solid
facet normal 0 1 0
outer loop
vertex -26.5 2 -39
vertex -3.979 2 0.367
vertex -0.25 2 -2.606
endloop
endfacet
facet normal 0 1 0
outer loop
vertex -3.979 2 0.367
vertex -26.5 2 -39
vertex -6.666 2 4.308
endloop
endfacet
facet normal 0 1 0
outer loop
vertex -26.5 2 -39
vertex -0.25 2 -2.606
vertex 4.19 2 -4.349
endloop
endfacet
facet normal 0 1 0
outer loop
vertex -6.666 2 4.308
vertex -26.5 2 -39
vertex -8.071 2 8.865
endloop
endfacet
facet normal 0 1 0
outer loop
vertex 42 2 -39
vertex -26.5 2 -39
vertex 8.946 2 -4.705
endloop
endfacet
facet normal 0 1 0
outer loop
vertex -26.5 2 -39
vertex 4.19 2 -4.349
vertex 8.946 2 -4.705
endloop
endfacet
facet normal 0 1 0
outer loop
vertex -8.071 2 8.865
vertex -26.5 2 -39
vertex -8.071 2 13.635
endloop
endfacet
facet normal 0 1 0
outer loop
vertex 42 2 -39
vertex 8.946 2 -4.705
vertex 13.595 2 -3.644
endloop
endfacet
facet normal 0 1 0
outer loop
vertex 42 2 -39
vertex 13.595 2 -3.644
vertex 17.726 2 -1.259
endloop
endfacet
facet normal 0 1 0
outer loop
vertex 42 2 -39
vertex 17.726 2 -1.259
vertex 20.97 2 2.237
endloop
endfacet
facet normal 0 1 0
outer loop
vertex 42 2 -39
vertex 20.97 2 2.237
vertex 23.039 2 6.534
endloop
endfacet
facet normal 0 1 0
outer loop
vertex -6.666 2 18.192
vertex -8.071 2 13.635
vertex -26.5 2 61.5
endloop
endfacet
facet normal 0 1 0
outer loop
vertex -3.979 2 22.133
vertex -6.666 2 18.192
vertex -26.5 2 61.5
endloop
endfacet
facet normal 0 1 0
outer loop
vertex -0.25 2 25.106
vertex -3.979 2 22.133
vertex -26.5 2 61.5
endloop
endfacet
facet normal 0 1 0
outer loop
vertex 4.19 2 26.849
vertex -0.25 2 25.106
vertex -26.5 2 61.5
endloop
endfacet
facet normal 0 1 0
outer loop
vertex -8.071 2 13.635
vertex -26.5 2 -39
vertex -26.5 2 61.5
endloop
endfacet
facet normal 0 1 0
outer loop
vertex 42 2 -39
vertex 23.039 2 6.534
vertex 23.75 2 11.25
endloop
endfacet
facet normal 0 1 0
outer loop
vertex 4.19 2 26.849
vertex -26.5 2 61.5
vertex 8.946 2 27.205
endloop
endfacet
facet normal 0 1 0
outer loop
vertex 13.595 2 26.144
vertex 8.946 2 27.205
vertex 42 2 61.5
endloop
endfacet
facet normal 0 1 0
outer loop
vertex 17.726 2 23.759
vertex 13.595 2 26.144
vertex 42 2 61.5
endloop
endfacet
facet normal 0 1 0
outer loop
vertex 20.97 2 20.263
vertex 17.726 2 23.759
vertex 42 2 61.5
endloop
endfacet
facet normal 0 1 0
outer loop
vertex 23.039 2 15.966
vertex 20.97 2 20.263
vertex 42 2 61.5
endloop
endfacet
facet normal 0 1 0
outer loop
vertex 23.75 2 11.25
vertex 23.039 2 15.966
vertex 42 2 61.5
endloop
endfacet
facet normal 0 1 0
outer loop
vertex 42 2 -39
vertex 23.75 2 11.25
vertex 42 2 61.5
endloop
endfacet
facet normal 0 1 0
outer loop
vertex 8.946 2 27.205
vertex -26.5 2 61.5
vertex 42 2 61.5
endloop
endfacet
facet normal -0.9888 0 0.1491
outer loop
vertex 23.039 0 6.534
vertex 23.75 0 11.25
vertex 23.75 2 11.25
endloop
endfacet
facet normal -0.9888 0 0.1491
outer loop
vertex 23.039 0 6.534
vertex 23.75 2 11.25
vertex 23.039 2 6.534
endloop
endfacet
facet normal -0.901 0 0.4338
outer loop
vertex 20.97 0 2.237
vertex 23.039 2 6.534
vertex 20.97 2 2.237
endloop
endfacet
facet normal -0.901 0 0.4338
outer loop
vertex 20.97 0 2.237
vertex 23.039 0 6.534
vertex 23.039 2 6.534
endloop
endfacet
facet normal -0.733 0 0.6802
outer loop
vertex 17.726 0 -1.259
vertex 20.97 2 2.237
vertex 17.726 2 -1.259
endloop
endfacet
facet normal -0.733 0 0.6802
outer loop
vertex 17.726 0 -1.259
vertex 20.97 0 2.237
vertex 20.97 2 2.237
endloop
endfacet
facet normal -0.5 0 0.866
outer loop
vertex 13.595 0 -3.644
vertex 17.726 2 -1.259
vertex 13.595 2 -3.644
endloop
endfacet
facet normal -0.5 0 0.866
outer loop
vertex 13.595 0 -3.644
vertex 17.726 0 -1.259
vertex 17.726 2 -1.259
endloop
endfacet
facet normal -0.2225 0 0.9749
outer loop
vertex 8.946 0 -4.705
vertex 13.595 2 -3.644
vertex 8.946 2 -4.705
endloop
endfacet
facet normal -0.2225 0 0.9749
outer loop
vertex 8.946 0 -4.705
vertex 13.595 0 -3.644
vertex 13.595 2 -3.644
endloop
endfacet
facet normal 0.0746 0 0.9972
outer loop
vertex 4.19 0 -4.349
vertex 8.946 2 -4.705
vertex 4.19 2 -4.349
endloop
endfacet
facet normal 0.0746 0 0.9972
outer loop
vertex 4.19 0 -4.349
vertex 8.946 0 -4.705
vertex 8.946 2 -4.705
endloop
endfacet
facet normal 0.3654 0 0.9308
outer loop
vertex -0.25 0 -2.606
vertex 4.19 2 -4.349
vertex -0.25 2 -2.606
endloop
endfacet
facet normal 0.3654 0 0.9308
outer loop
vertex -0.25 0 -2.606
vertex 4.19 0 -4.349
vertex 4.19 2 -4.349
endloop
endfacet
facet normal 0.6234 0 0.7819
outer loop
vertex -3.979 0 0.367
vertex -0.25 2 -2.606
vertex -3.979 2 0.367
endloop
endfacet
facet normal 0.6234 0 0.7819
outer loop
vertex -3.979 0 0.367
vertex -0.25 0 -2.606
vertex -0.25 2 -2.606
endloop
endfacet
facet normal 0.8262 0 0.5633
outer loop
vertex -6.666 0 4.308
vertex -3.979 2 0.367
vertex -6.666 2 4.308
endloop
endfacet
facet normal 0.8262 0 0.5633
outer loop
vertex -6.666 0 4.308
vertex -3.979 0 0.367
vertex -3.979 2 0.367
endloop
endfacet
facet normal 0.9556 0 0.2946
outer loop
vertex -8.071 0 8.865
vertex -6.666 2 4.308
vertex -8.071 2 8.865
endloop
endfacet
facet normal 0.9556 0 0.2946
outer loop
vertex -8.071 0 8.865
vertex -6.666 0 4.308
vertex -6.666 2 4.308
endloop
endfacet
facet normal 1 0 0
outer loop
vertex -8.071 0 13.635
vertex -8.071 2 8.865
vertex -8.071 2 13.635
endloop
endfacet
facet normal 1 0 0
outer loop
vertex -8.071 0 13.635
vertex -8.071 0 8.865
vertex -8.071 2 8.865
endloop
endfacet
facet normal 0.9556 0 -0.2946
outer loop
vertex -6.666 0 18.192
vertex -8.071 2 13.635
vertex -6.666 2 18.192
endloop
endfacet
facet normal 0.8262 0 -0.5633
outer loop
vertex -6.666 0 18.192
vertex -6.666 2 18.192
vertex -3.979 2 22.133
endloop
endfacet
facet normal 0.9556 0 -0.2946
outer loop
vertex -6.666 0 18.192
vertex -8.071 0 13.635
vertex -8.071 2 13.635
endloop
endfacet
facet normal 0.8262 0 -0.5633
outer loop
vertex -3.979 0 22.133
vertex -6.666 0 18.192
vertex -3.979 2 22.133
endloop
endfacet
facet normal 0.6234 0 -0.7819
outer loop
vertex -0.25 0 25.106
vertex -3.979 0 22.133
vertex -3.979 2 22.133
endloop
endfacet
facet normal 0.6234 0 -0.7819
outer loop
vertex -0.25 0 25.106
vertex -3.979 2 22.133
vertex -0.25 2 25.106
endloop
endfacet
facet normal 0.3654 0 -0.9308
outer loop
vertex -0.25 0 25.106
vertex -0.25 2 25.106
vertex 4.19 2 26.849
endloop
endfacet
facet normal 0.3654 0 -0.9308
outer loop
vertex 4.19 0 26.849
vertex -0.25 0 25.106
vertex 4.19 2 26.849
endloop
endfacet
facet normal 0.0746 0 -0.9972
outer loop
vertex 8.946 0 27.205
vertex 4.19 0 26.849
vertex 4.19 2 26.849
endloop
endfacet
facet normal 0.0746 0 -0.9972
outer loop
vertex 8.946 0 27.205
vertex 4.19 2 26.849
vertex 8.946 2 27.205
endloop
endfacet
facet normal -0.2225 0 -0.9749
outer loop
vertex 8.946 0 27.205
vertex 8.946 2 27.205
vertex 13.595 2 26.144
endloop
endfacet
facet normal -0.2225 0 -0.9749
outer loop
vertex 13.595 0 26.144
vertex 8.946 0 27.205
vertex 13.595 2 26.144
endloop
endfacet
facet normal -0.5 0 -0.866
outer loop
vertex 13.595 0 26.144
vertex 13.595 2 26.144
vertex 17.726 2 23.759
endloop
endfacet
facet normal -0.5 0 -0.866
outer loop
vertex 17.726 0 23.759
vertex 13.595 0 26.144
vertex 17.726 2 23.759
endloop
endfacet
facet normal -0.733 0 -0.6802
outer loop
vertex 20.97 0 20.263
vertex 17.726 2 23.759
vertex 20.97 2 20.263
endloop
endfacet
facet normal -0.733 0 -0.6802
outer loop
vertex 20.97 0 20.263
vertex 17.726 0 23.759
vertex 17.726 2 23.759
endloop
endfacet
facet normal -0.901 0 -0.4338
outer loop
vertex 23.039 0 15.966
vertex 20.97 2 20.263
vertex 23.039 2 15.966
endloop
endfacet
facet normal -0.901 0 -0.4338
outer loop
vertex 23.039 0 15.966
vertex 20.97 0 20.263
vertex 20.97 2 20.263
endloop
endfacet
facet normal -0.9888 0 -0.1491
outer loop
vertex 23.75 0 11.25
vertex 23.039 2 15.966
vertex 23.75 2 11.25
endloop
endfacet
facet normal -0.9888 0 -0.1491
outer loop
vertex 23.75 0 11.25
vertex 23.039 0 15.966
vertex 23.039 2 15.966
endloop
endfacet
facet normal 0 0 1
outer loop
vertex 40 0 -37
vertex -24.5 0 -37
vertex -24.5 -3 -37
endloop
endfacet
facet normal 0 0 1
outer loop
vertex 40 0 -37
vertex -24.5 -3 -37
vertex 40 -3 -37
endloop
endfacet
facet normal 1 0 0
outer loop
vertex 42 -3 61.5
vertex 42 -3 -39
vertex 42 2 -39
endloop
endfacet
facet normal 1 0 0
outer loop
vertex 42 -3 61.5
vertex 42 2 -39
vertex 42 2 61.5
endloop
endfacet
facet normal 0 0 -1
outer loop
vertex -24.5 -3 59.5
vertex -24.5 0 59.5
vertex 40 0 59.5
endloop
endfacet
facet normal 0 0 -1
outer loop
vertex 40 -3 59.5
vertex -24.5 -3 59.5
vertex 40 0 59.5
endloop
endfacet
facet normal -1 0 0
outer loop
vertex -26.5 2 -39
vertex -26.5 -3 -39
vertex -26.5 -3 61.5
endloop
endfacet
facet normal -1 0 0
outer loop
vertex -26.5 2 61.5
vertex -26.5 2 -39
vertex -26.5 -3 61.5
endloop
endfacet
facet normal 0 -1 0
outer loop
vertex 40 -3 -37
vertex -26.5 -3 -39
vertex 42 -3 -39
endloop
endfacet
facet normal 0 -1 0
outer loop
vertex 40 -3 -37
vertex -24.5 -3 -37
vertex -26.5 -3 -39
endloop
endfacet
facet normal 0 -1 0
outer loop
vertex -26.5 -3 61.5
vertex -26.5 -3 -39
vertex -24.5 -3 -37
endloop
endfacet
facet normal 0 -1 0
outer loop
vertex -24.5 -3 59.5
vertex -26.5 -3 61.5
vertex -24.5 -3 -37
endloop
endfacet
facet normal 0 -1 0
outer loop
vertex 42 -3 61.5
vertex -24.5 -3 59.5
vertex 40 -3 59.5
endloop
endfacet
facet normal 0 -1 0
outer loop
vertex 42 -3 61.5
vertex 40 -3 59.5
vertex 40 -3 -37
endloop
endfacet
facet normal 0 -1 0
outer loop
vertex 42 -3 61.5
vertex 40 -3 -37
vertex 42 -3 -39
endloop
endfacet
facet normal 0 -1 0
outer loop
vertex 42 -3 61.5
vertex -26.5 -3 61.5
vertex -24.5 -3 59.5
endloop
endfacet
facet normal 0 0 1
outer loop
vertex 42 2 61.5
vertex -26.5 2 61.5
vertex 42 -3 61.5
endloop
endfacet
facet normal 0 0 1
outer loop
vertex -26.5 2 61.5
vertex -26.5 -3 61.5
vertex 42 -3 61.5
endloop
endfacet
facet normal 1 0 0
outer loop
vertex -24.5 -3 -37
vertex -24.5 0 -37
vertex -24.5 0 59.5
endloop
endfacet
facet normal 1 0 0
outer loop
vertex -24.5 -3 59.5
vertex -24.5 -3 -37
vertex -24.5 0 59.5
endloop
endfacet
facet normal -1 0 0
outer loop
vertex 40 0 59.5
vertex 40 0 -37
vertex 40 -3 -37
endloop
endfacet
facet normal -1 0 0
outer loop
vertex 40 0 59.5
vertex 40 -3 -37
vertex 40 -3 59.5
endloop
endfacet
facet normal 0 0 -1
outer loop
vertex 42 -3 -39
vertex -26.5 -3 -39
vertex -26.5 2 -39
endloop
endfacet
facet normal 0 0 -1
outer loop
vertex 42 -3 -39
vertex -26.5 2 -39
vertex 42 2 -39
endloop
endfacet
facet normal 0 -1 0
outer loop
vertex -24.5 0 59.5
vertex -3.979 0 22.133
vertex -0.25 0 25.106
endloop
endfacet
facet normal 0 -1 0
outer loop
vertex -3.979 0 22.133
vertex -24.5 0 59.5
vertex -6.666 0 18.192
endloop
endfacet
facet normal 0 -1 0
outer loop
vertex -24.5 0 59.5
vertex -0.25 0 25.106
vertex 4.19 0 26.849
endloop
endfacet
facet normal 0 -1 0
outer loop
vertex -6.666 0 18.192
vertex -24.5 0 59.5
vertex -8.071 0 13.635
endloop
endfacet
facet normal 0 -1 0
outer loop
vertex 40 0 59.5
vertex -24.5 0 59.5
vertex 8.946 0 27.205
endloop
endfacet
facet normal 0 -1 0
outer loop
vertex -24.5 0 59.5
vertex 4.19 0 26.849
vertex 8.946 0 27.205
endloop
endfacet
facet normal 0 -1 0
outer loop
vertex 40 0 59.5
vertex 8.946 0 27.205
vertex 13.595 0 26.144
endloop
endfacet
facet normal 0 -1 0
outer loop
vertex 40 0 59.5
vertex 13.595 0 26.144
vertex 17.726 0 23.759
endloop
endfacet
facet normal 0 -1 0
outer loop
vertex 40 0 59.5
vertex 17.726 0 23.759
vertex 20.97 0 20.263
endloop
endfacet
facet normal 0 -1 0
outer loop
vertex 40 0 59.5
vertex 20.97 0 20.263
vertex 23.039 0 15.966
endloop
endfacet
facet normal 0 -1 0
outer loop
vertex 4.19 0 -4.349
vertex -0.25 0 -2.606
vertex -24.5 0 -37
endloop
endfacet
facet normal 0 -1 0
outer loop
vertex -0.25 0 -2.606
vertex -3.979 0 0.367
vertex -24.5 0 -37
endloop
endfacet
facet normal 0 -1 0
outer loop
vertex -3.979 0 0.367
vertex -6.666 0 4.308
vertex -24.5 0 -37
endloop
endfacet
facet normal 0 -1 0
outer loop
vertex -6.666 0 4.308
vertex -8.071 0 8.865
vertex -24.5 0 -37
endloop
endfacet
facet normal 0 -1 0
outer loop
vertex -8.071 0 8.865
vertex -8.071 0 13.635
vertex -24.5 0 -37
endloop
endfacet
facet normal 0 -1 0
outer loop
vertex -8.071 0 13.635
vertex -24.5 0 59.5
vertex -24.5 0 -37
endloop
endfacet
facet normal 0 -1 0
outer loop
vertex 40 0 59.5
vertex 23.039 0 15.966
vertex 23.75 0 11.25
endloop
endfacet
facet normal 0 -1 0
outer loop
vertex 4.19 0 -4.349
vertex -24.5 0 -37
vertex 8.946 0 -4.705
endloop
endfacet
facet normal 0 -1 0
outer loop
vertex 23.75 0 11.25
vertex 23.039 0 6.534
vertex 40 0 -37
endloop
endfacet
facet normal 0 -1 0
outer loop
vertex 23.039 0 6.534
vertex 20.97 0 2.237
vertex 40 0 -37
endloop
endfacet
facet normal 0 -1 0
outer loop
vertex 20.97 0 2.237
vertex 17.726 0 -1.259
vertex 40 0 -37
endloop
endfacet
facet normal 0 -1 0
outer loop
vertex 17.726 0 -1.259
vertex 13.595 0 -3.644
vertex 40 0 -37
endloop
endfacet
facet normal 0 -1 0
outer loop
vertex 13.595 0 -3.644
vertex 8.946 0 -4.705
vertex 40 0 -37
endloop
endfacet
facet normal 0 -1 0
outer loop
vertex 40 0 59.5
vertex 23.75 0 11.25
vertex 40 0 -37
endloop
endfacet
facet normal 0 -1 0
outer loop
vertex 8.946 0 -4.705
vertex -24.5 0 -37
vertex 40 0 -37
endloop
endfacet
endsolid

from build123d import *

# Parameters (mm, degrees)
CROQUIS1_W                   = 64.5
CROQUIS1_H                   = 96.5
CROQUIS1_R                   = 16
SALIENTE_EXTRUIR4_DEPTH      = 2
CROQUIS2_W                   = 68.5
CROQUIS2_H                   = 100.5
CROQUIS2_W_2                 = 64.5
CROQUIS2_H_2                 = 96.5
SALIENTE_EXTRUIR5_DEPTH      = 3
SALIENTE_EXTRUIR5_DEPTH_BACK = 2


with BuildPart() as part:
    # Croquis1 → Saliente-Extruir4 (new body)
    with BuildSketch(Plane(origin=(0, 0, 0), x_dir=(1, 0, 0), z_dir=(0, 1, 0))):
        with Locations((7.75, -11.25)):
            Rectangle(CROQUIS1_W, CROQUIS1_H)
        with Locations((7.75, -11.25)):
            Circle(CROQUIS1_R, mode=Mode.SUBTRACT)
    extrude(amount=SALIENTE_EXTRUIR4_DEPTH)

    # Croquis2 → Saliente-Extruir5 (add, two sides)
    with BuildSketch(Plane.XZ) as saliente_extruir5_sk:
        with Locations((7.75, 11.25)):
            Rectangle(CROQUIS2_W, CROQUIS2_H)
        with Locations((7.75, 11.25)):
            Rectangle(CROQUIS2_W_2, CROQUIS2_H_2, mode=Mode.SUBTRACT)
    extrude(amount=SALIENTE_EXTRUIR5_DEPTH)
    extrude(saliente_extruir5_sk.sketch, amount=-SALIENTE_EXTRUIR5_DEPTH_BACK)


solid = part.part
